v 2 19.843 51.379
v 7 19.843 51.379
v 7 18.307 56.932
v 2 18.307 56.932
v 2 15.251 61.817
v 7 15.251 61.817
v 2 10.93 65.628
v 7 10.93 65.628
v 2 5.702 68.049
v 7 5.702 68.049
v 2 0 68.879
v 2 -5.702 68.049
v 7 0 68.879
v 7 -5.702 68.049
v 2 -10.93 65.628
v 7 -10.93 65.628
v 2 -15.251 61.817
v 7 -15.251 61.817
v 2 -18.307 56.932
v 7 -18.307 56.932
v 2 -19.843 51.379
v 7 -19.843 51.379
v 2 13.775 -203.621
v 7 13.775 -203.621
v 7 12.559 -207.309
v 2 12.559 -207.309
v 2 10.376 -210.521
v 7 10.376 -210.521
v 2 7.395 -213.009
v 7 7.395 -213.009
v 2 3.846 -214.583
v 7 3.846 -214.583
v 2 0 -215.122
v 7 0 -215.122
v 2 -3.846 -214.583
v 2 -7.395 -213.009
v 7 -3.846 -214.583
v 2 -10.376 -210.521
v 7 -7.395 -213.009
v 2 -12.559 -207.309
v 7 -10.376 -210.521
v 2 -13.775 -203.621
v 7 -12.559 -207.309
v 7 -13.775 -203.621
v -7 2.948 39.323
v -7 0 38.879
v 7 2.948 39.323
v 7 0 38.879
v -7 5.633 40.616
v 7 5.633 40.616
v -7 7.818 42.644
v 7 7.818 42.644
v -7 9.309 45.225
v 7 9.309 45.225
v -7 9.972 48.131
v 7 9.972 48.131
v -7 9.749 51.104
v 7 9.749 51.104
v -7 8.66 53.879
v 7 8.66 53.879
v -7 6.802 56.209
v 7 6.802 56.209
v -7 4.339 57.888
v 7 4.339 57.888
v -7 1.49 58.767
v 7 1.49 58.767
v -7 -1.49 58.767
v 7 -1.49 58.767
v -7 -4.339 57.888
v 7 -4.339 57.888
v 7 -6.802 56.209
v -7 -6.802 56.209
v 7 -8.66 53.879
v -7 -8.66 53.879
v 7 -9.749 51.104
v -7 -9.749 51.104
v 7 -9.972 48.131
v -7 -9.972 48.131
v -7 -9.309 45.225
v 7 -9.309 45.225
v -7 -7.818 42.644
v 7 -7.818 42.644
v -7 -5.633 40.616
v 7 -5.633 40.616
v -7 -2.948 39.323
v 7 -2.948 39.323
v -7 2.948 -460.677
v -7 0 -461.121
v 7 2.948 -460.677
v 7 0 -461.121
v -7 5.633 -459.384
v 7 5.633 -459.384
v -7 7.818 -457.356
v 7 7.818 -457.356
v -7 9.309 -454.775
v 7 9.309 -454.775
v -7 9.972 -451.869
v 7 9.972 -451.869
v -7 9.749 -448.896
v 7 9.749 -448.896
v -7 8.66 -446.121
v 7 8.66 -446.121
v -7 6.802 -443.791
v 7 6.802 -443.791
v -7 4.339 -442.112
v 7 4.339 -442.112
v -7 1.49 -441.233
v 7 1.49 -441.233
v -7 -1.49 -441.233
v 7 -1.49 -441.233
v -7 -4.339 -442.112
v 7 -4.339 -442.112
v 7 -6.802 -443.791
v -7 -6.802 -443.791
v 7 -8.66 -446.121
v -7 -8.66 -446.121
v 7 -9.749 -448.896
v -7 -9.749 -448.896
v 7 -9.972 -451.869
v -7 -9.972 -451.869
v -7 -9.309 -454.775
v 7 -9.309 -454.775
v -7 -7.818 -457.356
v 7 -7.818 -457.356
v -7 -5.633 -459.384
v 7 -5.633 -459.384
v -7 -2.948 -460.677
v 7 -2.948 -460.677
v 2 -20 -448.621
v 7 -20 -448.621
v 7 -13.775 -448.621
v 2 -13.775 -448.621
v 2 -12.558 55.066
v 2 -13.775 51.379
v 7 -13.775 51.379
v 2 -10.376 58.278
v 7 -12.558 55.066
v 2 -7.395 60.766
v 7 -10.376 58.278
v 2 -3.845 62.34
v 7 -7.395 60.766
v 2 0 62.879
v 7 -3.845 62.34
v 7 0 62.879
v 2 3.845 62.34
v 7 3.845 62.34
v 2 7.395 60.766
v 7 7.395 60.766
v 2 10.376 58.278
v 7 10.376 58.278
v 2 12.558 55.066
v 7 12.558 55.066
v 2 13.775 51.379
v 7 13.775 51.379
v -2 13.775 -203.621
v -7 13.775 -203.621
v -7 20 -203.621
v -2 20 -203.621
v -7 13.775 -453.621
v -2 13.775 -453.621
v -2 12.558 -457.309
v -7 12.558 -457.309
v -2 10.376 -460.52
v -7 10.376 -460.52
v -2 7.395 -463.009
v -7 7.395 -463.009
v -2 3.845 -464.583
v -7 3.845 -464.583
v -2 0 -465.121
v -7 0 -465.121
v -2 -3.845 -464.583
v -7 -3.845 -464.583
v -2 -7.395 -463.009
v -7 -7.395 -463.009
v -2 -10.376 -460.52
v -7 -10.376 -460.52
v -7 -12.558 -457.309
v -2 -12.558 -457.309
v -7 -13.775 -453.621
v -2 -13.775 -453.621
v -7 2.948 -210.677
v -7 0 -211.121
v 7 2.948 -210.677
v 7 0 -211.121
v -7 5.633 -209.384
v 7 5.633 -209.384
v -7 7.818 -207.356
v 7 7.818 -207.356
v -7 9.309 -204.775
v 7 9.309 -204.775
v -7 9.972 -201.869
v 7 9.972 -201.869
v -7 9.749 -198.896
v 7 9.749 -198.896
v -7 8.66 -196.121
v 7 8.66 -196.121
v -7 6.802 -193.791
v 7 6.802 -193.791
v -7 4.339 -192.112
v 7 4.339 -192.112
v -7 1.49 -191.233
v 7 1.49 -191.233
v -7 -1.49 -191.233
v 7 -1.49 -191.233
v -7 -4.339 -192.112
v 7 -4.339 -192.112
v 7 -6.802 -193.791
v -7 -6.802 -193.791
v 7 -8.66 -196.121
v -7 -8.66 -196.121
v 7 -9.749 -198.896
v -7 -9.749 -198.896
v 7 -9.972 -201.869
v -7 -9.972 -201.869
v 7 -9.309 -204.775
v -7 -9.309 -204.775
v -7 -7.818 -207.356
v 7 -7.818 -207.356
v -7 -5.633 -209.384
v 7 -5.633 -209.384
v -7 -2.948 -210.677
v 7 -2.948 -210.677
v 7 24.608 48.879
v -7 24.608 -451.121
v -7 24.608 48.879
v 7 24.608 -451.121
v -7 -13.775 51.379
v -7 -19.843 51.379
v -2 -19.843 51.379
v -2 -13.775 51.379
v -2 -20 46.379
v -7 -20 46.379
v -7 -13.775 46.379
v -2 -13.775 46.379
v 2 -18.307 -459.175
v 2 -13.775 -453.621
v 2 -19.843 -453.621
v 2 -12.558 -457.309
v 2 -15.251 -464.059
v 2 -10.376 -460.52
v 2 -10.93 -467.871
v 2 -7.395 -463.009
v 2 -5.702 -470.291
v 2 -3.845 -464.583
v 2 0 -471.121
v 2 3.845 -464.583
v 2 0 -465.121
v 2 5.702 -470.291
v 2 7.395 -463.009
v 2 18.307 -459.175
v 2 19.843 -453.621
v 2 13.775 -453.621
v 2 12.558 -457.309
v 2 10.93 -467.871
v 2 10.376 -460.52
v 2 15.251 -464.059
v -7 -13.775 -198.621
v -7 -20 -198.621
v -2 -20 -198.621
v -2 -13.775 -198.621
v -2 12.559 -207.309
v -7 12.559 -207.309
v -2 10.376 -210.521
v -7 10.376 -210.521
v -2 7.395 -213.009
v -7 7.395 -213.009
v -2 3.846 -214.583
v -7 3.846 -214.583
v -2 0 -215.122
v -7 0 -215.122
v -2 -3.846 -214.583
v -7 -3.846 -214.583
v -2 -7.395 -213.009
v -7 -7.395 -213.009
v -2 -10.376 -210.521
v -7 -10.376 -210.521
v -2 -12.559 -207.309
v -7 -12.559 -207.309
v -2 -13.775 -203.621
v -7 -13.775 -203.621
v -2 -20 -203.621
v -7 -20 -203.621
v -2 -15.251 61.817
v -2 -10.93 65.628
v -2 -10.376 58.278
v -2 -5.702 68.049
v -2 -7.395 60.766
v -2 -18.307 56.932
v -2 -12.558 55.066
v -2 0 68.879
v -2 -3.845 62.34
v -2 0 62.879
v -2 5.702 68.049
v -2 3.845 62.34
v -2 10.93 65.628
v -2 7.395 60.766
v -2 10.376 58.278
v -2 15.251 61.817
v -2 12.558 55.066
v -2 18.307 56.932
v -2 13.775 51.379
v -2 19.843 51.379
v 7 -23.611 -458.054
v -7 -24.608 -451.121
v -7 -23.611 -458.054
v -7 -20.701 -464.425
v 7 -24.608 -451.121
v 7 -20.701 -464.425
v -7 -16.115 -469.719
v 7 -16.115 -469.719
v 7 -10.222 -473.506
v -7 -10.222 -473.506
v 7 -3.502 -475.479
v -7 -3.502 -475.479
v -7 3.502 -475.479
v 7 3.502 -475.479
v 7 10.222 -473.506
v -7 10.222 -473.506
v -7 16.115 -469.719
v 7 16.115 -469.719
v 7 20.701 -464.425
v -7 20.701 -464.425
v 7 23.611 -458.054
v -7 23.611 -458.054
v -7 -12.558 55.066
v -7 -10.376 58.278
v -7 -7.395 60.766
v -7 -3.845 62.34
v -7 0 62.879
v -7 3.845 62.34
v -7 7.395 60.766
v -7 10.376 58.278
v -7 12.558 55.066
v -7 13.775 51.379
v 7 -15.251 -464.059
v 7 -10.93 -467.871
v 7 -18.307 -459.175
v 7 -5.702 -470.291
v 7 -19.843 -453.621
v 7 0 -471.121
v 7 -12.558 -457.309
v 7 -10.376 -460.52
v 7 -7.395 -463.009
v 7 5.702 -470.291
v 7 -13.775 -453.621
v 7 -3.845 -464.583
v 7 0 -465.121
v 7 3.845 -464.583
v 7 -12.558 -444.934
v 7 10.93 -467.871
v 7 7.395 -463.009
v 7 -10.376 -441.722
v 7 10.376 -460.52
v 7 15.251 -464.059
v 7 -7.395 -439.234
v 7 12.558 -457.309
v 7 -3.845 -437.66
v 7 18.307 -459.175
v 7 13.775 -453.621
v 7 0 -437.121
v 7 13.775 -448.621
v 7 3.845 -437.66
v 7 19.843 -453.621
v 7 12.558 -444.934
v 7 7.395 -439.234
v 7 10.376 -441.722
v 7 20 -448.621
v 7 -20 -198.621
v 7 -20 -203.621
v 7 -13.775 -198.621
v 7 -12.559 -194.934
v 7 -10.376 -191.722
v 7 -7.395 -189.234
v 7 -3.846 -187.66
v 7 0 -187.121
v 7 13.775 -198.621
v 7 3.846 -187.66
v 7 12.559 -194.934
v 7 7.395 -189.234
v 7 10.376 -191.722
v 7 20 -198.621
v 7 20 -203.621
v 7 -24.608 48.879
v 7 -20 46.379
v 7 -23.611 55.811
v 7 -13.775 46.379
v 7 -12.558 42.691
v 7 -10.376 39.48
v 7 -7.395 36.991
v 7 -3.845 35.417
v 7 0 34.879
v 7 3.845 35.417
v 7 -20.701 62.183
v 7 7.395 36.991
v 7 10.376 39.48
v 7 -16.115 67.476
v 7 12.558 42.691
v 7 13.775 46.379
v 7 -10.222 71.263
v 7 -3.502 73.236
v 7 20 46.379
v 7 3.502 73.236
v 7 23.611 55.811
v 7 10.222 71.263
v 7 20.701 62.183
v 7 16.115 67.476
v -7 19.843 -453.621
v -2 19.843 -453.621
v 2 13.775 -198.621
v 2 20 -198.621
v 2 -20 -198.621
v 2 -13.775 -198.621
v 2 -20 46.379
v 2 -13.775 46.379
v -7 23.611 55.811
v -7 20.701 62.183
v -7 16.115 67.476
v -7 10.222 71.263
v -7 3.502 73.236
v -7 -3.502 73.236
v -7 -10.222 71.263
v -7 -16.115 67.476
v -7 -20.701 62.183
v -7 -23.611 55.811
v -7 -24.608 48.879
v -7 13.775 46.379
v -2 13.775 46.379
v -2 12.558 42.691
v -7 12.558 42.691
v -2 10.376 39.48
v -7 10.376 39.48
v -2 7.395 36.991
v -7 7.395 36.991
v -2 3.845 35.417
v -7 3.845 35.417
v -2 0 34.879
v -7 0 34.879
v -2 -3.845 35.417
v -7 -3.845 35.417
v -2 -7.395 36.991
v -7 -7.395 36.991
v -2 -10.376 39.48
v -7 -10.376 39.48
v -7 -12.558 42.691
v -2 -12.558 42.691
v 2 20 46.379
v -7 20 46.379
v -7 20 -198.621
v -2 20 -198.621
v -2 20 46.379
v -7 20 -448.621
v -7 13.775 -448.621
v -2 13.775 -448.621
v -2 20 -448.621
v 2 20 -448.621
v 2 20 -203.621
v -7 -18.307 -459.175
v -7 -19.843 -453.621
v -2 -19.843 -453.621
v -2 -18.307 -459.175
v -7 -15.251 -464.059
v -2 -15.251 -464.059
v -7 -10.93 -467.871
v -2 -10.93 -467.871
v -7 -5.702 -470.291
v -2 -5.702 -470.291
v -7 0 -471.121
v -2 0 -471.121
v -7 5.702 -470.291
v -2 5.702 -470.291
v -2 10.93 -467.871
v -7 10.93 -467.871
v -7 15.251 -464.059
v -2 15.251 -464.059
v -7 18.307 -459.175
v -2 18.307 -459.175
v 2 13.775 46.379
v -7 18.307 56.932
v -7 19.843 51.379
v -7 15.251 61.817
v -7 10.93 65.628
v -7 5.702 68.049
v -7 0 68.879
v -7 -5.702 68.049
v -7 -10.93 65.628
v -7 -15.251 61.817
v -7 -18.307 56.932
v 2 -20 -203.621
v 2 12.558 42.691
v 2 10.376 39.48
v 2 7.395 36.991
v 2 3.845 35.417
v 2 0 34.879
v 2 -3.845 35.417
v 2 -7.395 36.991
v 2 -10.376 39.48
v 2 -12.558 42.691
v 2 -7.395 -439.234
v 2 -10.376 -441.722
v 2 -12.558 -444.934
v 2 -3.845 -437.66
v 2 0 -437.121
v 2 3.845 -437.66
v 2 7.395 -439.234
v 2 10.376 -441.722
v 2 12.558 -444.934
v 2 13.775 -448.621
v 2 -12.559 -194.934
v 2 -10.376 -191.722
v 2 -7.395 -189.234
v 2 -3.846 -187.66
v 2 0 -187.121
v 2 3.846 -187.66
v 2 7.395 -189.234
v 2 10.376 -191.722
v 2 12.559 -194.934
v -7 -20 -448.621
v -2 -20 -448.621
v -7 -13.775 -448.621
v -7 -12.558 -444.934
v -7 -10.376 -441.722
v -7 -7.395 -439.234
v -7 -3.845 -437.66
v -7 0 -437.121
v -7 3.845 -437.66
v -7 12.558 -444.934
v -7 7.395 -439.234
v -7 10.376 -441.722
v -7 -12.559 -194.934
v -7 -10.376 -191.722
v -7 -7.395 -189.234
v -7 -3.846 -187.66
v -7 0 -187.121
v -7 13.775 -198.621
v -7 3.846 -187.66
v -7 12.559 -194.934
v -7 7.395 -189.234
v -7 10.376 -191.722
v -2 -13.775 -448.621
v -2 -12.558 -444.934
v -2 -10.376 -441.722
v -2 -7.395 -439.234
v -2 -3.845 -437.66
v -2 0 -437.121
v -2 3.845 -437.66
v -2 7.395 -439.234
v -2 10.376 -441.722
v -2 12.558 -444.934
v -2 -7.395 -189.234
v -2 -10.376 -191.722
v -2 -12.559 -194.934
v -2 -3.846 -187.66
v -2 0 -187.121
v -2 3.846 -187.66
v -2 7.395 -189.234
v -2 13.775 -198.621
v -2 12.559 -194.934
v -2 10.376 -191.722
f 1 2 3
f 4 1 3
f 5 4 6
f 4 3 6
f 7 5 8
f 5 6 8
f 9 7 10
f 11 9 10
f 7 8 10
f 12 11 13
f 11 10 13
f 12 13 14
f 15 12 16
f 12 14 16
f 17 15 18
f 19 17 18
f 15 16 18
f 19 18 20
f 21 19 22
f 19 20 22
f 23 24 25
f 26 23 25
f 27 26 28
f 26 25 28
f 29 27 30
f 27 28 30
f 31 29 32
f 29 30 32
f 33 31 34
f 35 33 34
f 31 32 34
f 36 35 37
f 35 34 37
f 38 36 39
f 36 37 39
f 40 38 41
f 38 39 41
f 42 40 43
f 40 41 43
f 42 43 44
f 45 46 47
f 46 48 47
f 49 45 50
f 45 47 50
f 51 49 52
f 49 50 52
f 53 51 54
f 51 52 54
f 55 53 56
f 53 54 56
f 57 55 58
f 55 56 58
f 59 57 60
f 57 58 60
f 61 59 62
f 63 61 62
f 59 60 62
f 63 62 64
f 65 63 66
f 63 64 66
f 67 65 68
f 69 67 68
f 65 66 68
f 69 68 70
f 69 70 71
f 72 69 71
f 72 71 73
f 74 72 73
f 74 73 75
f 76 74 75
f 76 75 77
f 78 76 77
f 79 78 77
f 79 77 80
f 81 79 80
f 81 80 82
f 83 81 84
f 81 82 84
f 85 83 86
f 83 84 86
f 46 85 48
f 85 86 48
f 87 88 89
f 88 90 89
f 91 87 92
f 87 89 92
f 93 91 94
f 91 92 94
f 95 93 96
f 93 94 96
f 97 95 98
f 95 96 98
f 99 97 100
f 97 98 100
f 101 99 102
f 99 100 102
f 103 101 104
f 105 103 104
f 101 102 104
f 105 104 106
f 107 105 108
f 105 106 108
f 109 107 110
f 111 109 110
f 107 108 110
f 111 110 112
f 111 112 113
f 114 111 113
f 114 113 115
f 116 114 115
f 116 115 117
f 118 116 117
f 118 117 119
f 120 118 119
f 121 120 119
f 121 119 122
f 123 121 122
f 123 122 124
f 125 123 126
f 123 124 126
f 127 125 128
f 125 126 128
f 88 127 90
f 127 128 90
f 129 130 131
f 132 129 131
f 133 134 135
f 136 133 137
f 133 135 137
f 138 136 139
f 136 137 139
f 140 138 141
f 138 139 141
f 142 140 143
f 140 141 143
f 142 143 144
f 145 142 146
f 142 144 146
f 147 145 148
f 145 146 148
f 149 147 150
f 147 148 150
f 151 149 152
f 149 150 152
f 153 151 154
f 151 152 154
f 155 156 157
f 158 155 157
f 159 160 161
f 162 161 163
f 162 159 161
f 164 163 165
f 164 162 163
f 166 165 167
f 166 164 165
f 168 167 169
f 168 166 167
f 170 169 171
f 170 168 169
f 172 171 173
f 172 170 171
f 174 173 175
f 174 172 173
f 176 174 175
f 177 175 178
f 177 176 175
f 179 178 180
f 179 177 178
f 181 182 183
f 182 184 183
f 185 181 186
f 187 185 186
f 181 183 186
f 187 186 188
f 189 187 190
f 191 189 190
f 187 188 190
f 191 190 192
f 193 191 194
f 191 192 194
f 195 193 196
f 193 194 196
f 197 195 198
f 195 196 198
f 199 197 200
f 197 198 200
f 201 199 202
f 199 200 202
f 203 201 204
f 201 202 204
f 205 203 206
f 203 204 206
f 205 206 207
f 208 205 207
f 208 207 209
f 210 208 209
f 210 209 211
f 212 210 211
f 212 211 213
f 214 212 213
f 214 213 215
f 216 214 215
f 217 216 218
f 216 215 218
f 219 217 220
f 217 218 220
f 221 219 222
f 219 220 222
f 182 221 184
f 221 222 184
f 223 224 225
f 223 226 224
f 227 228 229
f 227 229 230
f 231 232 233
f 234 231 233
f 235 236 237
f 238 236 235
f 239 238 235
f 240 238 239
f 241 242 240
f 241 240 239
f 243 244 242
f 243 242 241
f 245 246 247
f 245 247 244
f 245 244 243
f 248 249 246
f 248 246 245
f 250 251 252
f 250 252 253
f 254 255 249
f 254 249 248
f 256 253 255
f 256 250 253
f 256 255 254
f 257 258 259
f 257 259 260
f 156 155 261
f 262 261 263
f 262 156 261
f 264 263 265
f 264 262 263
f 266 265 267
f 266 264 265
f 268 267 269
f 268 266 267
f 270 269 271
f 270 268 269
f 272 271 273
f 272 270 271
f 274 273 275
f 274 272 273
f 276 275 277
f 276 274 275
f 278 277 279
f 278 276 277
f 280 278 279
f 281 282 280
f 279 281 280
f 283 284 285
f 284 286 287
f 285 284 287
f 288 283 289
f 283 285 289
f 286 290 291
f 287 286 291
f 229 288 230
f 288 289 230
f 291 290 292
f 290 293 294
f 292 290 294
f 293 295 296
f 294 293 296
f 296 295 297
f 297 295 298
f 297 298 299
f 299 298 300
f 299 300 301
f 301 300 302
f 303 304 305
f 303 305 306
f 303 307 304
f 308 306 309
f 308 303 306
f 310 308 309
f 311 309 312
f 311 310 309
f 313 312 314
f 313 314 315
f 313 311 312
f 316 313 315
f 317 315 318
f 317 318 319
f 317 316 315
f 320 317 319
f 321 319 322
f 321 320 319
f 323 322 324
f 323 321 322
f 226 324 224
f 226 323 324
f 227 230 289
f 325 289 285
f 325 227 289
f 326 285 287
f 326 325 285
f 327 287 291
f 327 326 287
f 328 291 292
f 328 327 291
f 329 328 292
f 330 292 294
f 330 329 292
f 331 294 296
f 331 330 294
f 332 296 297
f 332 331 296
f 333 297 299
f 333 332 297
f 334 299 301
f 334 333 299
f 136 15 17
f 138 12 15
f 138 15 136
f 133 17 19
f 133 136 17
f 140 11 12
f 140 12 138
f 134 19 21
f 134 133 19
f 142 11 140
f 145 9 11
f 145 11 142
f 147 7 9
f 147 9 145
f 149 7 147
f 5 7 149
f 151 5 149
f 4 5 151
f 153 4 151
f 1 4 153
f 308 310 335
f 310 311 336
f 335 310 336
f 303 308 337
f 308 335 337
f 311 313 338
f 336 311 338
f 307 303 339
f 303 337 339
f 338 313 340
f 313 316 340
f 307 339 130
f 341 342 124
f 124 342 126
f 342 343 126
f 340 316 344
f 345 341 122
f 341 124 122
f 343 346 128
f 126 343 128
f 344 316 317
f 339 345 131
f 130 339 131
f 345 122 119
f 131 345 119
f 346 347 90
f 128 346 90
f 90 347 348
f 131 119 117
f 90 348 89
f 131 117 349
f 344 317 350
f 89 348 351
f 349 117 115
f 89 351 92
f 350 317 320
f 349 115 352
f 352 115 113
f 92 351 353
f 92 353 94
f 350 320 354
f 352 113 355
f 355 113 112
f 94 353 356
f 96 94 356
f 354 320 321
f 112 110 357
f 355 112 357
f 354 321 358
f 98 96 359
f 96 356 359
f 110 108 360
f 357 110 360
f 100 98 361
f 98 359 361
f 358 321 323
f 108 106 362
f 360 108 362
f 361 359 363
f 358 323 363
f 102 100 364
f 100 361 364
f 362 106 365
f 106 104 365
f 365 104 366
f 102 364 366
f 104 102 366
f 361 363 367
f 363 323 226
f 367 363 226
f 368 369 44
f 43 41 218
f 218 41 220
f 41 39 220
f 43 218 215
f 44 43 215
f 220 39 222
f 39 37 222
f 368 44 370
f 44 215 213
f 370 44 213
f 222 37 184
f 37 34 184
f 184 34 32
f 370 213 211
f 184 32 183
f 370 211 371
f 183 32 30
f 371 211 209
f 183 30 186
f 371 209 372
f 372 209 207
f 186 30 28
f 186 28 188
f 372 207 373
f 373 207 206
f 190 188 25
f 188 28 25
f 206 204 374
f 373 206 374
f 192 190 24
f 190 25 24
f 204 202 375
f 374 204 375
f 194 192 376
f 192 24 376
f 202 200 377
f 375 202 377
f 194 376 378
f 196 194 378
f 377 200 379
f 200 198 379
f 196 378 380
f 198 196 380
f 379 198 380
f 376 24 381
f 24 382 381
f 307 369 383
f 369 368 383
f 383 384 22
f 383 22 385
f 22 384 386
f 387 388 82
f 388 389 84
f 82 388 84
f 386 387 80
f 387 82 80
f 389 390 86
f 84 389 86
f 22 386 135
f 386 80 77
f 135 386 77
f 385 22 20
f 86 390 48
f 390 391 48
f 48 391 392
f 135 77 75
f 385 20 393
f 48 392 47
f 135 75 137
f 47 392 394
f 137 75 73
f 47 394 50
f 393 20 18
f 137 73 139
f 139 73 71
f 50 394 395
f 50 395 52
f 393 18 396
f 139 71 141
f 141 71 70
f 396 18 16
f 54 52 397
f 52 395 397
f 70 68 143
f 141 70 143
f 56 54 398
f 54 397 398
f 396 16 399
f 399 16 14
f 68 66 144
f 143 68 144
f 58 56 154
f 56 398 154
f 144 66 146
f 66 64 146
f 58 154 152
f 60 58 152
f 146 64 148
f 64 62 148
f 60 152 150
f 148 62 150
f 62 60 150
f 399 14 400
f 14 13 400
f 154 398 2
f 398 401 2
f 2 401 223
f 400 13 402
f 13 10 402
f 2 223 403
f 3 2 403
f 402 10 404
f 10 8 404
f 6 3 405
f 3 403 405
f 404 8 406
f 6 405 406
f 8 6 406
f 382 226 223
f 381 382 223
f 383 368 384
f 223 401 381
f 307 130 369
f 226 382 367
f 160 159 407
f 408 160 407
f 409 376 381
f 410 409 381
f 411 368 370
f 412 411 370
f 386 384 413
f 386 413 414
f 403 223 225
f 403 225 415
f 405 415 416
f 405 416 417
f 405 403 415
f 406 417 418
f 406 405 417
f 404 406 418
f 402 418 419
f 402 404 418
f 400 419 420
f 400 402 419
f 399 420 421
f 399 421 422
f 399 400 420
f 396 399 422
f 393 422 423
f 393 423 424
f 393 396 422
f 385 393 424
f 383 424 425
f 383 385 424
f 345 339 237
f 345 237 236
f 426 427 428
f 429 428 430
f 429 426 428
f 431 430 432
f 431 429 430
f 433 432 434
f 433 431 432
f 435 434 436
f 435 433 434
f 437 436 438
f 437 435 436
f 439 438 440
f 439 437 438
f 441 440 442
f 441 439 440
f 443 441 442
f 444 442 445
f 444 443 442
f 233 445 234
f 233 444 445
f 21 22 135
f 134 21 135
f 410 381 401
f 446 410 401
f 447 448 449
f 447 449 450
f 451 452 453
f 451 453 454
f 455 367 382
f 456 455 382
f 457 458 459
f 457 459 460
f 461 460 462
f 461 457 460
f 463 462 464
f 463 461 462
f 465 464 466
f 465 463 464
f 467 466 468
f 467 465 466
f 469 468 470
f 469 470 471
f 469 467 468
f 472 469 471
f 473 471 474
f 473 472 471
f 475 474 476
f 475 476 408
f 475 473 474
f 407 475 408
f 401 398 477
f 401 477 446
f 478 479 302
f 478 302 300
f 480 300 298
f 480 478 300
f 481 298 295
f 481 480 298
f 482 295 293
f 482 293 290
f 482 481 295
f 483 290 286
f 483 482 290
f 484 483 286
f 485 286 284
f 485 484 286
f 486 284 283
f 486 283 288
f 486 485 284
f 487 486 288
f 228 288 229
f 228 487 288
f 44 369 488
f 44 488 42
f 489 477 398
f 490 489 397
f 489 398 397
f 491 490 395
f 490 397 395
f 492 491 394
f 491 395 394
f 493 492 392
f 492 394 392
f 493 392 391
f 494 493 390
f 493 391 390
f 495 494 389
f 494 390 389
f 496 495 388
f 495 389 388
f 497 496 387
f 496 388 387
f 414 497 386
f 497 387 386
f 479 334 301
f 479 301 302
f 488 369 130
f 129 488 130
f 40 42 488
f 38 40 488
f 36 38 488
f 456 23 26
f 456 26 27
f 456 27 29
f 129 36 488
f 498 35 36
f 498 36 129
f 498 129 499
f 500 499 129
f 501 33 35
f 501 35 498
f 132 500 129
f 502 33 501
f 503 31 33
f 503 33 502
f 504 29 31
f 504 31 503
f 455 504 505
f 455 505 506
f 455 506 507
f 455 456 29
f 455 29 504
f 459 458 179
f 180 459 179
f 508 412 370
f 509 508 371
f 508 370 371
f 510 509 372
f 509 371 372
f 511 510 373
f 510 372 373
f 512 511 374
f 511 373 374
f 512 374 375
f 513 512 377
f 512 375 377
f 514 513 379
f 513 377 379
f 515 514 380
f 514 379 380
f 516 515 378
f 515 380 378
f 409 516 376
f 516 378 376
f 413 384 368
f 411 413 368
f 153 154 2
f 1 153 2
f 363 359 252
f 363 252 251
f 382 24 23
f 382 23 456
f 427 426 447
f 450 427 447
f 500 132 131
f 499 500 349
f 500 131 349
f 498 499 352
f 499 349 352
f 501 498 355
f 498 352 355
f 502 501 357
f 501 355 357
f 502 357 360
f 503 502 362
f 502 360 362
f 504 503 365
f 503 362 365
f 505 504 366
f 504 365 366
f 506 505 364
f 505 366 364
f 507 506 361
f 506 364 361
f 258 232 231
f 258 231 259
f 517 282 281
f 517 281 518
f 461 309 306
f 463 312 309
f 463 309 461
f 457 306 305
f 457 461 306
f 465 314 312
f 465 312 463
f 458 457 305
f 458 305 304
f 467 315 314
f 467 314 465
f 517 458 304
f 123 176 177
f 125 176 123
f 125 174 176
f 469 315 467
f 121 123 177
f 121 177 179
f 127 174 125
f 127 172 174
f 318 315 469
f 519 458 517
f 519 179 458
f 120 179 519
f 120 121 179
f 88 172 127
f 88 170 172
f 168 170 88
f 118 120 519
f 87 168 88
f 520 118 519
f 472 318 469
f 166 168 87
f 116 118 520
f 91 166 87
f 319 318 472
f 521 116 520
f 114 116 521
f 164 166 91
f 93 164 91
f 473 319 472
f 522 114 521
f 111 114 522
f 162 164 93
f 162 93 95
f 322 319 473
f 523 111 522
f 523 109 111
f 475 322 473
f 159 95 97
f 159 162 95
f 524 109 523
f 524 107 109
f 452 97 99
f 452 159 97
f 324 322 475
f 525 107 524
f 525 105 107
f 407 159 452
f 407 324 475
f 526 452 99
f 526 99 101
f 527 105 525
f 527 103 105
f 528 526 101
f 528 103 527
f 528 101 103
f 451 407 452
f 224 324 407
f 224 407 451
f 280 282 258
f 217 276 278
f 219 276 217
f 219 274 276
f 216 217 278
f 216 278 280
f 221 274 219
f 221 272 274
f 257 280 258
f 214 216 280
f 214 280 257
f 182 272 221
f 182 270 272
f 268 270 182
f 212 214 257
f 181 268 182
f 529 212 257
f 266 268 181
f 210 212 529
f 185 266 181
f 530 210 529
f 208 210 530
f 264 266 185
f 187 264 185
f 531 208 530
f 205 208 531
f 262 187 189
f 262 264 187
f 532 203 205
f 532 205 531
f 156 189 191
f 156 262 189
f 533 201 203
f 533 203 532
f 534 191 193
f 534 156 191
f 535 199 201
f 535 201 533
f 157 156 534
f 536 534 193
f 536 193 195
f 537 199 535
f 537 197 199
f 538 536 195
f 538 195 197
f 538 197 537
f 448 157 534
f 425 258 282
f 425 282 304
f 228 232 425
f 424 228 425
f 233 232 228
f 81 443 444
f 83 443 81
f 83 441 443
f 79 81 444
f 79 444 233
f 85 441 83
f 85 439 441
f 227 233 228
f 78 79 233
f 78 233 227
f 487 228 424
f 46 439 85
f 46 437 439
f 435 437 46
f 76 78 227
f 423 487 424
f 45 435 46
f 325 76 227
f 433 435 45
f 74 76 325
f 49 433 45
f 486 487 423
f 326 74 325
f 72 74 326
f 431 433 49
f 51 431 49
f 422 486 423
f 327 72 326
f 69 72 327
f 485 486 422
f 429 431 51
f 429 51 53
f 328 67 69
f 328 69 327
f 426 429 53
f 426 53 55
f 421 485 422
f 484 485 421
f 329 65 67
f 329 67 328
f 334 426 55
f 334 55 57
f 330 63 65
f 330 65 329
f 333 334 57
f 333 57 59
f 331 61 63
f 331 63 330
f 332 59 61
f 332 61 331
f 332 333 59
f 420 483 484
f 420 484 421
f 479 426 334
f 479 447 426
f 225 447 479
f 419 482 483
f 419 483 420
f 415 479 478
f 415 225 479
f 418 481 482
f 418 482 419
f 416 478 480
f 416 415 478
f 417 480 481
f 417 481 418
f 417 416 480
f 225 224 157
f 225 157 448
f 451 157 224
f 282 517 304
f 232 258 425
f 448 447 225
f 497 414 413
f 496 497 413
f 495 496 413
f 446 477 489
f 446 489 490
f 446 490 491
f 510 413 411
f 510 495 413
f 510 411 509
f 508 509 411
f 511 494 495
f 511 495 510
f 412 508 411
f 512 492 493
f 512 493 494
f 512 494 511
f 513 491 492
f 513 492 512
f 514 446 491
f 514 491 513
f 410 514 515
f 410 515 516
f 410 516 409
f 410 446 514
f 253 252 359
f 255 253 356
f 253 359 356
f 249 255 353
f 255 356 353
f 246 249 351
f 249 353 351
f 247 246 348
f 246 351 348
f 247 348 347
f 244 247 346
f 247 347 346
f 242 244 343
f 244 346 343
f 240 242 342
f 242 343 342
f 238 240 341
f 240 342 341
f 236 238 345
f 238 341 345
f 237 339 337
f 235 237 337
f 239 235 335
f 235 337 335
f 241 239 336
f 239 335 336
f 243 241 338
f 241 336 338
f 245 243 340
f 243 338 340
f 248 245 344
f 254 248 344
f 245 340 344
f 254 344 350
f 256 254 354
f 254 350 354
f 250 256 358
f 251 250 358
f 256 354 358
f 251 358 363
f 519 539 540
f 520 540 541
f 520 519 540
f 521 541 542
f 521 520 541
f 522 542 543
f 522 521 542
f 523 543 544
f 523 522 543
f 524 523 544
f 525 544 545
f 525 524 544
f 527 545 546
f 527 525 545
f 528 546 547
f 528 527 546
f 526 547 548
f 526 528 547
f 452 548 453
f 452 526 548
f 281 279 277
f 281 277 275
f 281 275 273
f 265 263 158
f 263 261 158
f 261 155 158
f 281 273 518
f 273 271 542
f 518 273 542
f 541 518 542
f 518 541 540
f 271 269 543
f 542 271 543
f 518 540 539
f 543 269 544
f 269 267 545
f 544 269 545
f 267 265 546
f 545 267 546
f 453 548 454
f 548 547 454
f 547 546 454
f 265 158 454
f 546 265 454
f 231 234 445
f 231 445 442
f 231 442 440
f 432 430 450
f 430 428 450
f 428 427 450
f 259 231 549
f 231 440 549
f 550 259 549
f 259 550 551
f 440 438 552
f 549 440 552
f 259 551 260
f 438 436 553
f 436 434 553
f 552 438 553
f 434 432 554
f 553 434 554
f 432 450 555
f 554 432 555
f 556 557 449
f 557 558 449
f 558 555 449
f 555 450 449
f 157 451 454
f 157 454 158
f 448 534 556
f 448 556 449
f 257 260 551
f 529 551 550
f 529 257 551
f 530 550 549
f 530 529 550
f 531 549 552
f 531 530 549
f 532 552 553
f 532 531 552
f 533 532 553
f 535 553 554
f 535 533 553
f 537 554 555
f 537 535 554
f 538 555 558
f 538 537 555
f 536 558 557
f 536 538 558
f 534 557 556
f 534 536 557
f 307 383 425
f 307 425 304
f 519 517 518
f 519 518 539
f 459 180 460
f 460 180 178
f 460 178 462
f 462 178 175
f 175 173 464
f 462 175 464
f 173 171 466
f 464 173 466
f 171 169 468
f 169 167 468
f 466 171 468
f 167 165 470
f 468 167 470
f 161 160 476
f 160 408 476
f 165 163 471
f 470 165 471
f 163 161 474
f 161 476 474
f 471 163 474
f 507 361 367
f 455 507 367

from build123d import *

# Parameters (mm, degrees)
BOSS_EXTRUDE1_DEPTH = 2
EXTRUDE_START       = 5
EXTRUDE_1_DEPTH     = 5
EXTRUDE_2_DEPTH     = 5
SKETCH_4_R          = 14
SKETCH_4_R_2        = 14.00018903
CUT_EXTRUDE_1_DEPTH = 5
SKETCH1_3_R         = 10
CUT_EXTRUDE_2_DEPTH = 15
RIB_2_REACH         = 478.571
SKETCH_5_WALLS_W    = 5
SKETCH_5_WALLS_H    = 961.14191471
SKETCH_5_WALLS_H_2  = 961.14172568


with BuildPart() as part:
    # Sketch1 → Boss-Extrude1 (new, symmetric)
    with BuildSketch(Plane(origin=(0, 0, 0), x_dir=(0, 0, -1), z_dir=(1, 0, 0))):
        with BuildLine():
            Line((451.121433311, 24.607830126), (-48.878566689, 24.607830126))
            ThreePointArc((-48.878566689, 24.607830126), (-73.486396815, 0), (-48.878566689, -24.607830126))
            Line((-48.878566689, -24.607830126), (451.121433311, -24.607830126))
            ThreePointArc((451.121433311, -24.607830126), (475.729263437, 0), (451.121433311, 24.607830126))
        make_face()
    extrude(amount=BOSS_EXTRUDE1_DEPTH, both=True)

    # Sketch 1 → Extrude 1 (add)
    with BuildSketch(Plane(origin=(2, 0, 0), x_dir=(0, 0, -1), z_dir=(1, 0, 0)).offset(EXTRUDE_START)):
        with BuildLine():
            Line((451.121433311, 24.607830126), (-48.878566689, 24.607830126))
            ThreePointArc((-48.878566689, 24.607830126), (-73.486396815, 0), (-48.878566689, -24.607830126))
            Line((-48.878566689, -24.607830126), (451.121433311, -24.607830126))
            ThreePointArc((451.121433311, -24.607830126), (475.729263437, 0), (451.121433311, 24.607830126))
        make_face()
    extrude(amount=-EXTRUDE_1_DEPTH)

    # Sketch 2 → Extrude 2 (add)
    with BuildSketch(Plane.ZY.offset(2)):
        with BuildLine():
            Line((-451.121433311, 24.607830126), (48.878566689, 24.607830126))
            ThreePointArc((48.878566689, 24.607830126), (73.486396815, 0), (48.878566689, -24.607830126))
            Line((48.878566689, -24.607830126), (-451.121433311, -24.607830126))
            ThreePointArc((-451.121433311, -24.607830126), (-475.729263437, 0), (-451.121433311, 24.607830126))
        make_face()
    extrude(amount=EXTRUDE_2_DEPTH)

    # Sketch 4 → Cut-Extrude 1 (cut)
    with BuildSketch(Plane.ZY.offset(7)):
        with BuildLine():
            Line((48.878566689, 20), (-451.121433311, 20))
            ThreePointArc((-451.121433311, 20), (-471.121433311, 0), (-451.121433311, -20))
            Line((-451.121433311, -20), (48.878566689, -20))
            ThreePointArc((48.878566689, -20), (68.878566689, 0), (48.878566689, 20))
        make_face()
        with Locations((-451.121433311, 0)):
            Circle(SKETCH_4_R, mode=Mode.SUBTRACT)
        with Locations((-201.121433311, 0)):
            Circle(SKETCH_4_R_2, mode=Mode.SUBTRACT)
        with Locations((48.878566689, 0)):
            Circle(SKETCH_4_R, mode=Mode.SUBTRACT)
    cut_extrude_1 = extrude(amount=-CUT_EXTRUDE_1_DEPTH, mode=Mode.SUBTRACT)

    # Mirror 1: Cut-Extrude 1 across plane
    add(cut_extrude_1.mirror(Plane.ZY), mode=Mode.SUBTRACT)

    # Sketch1_3 → Cut-Extrude 2 (cut, symmetric)
    with BuildSketch(Plane(origin=(0, 0, 0), x_dir=(0, 0, -1), z_dir=(1, 0, 0))):
        with Locations((451.121433311, 0)):
            Circle(SKETCH1_3_R)
        with Locations((201.121433311, 0)):
            Circle(SKETCH1_3_R)
        with Locations((-48.878566689, 0)):
            Circle(SKETCH1_3_R)
    extrude(amount=CUT_EXTRUDE_2_DEPTH, both=True, mode=Mode.SUBTRACT)

    # Sketch 5 walls → Rib 2 (add, up to next)
    with BuildSketch(Plane.ZY.offset(7), mode=Mode.PRIVATE) as rib_2_sk1:
        with Locations((48.878566689, 17)):
            Rectangle(SKETCH_5_WALLS_W, SKETCH_5_WALLS_H)
    rib_2_tool1 = extrude(rib_2_sk1.sketch, amount=-RIB_2_REACH, mode=Mode.PRIVATE) - part.part
    # Sketch 5 walls → Rib 2 (add, up to next)
    with BuildSketch(Plane.ZY.offset(7), mode=Mode.PRIVATE) as rib_2_sk2:
        with Locations((48.878566689, -17)):
            Rectangle(SKETCH_5_WALLS_W, SKETCH_5_WALLS_H)
    rib_2_tool2 = extrude(rib_2_sk2.sketch, amount=-RIB_2_REACH, mode=Mode.PRIVATE) - part.part
    # Sketch 5 walls → Rib 2 (add, up to next)
    with BuildSketch(Plane.ZY.offset(7), mode=Mode.PRIVATE) as rib_2_sk3:
        with Locations((-201.121433311, -17.000094515)):
            Rectangle(SKETCH_5_WALLS_W, SKETCH_5_WALLS_H_2)
    rib_2_tool3 = extrude(rib_2_sk3.sketch, amount=-RIB_2_REACH, mode=Mode.PRIVATE) - part.part
    # Sketch 5 walls → Rib 2 (add, up to next)
    with BuildSketch(Plane.ZY.offset(7), mode=Mode.PRIVATE) as rib_2_sk4:
        with Locations((-201.121433311, 17.000094515)):
            Rectangle(SKETCH_5_WALLS_W, SKETCH_5_WALLS_H_2)
    rib_2_tool4 = extrude(rib_2_sk4.sketch, amount=-RIB_2_REACH, mode=Mode.PRIVATE) - part.part
    # Sketch 5 walls → Rib 2 (add, up to next)
    with BuildSketch(Plane.ZY.offset(7), mode=Mode.PRIVATE) as rib_2_sk5:
        with Locations((-451.121433311, 17)):
            Rectangle(SKETCH_5_WALLS_W, SKETCH_5_WALLS_H)
    rib_2_tool5 = extrude(rib_2_sk5.sketch, amount=-RIB_2_REACH, mode=Mode.PRIVATE) - part.part
    # Sketch 5 walls → Rib 2 (add, up to next)
    with BuildSketch(Plane.ZY.offset(7), mode=Mode.PRIVATE) as rib_2_sk6:
        with Locations((-451.121433311, -17)):
            Rectangle(SKETCH_5_WALLS_W, SKETCH_5_WALLS_H)
    rib_2_tool6 = extrude(rib_2_sk6.sketch, amount=-RIB_2_REACH, mode=Mode.PRIVATE) - part.part
    rib_2_1 = rib_2_tool1.solids().sort_by_distance((-7, 17, 48.878566689))[0]
    add(rib_2_1)
    rib_2_2 = rib_2_tool2.solids().sort_by_distance((-7, -17, 48.878566689))[0]
    add(rib_2_2)
    rib_2_3 = rib_2_tool3.solids().sort_by_distance((-7, -17.000094515, -201.121433311))[0]
    add(rib_2_3)
    rib_2_4 = rib_2_tool4.solids().sort_by_distance((-7, 17.000094515, -201.121433311))[0]
    add(rib_2_4)
    rib_2_5 = rib_2_tool5.solids().sort_by_distance((-7, 17, -451.121433311))[0]
    add(rib_2_5)
    rib_2_6 = rib_2_tool6.solids().sort_by_distance((-7, -17, -451.121433311))[0]
    add(rib_2_6)
    rib_2 = rib_2_1 + rib_2_2 + rib_2_3 + rib_2_4 + rib_2_5 + rib_2_6  # Rib 2 as one shape, for the pattern or mirror that repeats it

    # Mirror 2: Rib 2 across plane
    add(rib_2.mirror(Plane.ZY))


solid = part.part
